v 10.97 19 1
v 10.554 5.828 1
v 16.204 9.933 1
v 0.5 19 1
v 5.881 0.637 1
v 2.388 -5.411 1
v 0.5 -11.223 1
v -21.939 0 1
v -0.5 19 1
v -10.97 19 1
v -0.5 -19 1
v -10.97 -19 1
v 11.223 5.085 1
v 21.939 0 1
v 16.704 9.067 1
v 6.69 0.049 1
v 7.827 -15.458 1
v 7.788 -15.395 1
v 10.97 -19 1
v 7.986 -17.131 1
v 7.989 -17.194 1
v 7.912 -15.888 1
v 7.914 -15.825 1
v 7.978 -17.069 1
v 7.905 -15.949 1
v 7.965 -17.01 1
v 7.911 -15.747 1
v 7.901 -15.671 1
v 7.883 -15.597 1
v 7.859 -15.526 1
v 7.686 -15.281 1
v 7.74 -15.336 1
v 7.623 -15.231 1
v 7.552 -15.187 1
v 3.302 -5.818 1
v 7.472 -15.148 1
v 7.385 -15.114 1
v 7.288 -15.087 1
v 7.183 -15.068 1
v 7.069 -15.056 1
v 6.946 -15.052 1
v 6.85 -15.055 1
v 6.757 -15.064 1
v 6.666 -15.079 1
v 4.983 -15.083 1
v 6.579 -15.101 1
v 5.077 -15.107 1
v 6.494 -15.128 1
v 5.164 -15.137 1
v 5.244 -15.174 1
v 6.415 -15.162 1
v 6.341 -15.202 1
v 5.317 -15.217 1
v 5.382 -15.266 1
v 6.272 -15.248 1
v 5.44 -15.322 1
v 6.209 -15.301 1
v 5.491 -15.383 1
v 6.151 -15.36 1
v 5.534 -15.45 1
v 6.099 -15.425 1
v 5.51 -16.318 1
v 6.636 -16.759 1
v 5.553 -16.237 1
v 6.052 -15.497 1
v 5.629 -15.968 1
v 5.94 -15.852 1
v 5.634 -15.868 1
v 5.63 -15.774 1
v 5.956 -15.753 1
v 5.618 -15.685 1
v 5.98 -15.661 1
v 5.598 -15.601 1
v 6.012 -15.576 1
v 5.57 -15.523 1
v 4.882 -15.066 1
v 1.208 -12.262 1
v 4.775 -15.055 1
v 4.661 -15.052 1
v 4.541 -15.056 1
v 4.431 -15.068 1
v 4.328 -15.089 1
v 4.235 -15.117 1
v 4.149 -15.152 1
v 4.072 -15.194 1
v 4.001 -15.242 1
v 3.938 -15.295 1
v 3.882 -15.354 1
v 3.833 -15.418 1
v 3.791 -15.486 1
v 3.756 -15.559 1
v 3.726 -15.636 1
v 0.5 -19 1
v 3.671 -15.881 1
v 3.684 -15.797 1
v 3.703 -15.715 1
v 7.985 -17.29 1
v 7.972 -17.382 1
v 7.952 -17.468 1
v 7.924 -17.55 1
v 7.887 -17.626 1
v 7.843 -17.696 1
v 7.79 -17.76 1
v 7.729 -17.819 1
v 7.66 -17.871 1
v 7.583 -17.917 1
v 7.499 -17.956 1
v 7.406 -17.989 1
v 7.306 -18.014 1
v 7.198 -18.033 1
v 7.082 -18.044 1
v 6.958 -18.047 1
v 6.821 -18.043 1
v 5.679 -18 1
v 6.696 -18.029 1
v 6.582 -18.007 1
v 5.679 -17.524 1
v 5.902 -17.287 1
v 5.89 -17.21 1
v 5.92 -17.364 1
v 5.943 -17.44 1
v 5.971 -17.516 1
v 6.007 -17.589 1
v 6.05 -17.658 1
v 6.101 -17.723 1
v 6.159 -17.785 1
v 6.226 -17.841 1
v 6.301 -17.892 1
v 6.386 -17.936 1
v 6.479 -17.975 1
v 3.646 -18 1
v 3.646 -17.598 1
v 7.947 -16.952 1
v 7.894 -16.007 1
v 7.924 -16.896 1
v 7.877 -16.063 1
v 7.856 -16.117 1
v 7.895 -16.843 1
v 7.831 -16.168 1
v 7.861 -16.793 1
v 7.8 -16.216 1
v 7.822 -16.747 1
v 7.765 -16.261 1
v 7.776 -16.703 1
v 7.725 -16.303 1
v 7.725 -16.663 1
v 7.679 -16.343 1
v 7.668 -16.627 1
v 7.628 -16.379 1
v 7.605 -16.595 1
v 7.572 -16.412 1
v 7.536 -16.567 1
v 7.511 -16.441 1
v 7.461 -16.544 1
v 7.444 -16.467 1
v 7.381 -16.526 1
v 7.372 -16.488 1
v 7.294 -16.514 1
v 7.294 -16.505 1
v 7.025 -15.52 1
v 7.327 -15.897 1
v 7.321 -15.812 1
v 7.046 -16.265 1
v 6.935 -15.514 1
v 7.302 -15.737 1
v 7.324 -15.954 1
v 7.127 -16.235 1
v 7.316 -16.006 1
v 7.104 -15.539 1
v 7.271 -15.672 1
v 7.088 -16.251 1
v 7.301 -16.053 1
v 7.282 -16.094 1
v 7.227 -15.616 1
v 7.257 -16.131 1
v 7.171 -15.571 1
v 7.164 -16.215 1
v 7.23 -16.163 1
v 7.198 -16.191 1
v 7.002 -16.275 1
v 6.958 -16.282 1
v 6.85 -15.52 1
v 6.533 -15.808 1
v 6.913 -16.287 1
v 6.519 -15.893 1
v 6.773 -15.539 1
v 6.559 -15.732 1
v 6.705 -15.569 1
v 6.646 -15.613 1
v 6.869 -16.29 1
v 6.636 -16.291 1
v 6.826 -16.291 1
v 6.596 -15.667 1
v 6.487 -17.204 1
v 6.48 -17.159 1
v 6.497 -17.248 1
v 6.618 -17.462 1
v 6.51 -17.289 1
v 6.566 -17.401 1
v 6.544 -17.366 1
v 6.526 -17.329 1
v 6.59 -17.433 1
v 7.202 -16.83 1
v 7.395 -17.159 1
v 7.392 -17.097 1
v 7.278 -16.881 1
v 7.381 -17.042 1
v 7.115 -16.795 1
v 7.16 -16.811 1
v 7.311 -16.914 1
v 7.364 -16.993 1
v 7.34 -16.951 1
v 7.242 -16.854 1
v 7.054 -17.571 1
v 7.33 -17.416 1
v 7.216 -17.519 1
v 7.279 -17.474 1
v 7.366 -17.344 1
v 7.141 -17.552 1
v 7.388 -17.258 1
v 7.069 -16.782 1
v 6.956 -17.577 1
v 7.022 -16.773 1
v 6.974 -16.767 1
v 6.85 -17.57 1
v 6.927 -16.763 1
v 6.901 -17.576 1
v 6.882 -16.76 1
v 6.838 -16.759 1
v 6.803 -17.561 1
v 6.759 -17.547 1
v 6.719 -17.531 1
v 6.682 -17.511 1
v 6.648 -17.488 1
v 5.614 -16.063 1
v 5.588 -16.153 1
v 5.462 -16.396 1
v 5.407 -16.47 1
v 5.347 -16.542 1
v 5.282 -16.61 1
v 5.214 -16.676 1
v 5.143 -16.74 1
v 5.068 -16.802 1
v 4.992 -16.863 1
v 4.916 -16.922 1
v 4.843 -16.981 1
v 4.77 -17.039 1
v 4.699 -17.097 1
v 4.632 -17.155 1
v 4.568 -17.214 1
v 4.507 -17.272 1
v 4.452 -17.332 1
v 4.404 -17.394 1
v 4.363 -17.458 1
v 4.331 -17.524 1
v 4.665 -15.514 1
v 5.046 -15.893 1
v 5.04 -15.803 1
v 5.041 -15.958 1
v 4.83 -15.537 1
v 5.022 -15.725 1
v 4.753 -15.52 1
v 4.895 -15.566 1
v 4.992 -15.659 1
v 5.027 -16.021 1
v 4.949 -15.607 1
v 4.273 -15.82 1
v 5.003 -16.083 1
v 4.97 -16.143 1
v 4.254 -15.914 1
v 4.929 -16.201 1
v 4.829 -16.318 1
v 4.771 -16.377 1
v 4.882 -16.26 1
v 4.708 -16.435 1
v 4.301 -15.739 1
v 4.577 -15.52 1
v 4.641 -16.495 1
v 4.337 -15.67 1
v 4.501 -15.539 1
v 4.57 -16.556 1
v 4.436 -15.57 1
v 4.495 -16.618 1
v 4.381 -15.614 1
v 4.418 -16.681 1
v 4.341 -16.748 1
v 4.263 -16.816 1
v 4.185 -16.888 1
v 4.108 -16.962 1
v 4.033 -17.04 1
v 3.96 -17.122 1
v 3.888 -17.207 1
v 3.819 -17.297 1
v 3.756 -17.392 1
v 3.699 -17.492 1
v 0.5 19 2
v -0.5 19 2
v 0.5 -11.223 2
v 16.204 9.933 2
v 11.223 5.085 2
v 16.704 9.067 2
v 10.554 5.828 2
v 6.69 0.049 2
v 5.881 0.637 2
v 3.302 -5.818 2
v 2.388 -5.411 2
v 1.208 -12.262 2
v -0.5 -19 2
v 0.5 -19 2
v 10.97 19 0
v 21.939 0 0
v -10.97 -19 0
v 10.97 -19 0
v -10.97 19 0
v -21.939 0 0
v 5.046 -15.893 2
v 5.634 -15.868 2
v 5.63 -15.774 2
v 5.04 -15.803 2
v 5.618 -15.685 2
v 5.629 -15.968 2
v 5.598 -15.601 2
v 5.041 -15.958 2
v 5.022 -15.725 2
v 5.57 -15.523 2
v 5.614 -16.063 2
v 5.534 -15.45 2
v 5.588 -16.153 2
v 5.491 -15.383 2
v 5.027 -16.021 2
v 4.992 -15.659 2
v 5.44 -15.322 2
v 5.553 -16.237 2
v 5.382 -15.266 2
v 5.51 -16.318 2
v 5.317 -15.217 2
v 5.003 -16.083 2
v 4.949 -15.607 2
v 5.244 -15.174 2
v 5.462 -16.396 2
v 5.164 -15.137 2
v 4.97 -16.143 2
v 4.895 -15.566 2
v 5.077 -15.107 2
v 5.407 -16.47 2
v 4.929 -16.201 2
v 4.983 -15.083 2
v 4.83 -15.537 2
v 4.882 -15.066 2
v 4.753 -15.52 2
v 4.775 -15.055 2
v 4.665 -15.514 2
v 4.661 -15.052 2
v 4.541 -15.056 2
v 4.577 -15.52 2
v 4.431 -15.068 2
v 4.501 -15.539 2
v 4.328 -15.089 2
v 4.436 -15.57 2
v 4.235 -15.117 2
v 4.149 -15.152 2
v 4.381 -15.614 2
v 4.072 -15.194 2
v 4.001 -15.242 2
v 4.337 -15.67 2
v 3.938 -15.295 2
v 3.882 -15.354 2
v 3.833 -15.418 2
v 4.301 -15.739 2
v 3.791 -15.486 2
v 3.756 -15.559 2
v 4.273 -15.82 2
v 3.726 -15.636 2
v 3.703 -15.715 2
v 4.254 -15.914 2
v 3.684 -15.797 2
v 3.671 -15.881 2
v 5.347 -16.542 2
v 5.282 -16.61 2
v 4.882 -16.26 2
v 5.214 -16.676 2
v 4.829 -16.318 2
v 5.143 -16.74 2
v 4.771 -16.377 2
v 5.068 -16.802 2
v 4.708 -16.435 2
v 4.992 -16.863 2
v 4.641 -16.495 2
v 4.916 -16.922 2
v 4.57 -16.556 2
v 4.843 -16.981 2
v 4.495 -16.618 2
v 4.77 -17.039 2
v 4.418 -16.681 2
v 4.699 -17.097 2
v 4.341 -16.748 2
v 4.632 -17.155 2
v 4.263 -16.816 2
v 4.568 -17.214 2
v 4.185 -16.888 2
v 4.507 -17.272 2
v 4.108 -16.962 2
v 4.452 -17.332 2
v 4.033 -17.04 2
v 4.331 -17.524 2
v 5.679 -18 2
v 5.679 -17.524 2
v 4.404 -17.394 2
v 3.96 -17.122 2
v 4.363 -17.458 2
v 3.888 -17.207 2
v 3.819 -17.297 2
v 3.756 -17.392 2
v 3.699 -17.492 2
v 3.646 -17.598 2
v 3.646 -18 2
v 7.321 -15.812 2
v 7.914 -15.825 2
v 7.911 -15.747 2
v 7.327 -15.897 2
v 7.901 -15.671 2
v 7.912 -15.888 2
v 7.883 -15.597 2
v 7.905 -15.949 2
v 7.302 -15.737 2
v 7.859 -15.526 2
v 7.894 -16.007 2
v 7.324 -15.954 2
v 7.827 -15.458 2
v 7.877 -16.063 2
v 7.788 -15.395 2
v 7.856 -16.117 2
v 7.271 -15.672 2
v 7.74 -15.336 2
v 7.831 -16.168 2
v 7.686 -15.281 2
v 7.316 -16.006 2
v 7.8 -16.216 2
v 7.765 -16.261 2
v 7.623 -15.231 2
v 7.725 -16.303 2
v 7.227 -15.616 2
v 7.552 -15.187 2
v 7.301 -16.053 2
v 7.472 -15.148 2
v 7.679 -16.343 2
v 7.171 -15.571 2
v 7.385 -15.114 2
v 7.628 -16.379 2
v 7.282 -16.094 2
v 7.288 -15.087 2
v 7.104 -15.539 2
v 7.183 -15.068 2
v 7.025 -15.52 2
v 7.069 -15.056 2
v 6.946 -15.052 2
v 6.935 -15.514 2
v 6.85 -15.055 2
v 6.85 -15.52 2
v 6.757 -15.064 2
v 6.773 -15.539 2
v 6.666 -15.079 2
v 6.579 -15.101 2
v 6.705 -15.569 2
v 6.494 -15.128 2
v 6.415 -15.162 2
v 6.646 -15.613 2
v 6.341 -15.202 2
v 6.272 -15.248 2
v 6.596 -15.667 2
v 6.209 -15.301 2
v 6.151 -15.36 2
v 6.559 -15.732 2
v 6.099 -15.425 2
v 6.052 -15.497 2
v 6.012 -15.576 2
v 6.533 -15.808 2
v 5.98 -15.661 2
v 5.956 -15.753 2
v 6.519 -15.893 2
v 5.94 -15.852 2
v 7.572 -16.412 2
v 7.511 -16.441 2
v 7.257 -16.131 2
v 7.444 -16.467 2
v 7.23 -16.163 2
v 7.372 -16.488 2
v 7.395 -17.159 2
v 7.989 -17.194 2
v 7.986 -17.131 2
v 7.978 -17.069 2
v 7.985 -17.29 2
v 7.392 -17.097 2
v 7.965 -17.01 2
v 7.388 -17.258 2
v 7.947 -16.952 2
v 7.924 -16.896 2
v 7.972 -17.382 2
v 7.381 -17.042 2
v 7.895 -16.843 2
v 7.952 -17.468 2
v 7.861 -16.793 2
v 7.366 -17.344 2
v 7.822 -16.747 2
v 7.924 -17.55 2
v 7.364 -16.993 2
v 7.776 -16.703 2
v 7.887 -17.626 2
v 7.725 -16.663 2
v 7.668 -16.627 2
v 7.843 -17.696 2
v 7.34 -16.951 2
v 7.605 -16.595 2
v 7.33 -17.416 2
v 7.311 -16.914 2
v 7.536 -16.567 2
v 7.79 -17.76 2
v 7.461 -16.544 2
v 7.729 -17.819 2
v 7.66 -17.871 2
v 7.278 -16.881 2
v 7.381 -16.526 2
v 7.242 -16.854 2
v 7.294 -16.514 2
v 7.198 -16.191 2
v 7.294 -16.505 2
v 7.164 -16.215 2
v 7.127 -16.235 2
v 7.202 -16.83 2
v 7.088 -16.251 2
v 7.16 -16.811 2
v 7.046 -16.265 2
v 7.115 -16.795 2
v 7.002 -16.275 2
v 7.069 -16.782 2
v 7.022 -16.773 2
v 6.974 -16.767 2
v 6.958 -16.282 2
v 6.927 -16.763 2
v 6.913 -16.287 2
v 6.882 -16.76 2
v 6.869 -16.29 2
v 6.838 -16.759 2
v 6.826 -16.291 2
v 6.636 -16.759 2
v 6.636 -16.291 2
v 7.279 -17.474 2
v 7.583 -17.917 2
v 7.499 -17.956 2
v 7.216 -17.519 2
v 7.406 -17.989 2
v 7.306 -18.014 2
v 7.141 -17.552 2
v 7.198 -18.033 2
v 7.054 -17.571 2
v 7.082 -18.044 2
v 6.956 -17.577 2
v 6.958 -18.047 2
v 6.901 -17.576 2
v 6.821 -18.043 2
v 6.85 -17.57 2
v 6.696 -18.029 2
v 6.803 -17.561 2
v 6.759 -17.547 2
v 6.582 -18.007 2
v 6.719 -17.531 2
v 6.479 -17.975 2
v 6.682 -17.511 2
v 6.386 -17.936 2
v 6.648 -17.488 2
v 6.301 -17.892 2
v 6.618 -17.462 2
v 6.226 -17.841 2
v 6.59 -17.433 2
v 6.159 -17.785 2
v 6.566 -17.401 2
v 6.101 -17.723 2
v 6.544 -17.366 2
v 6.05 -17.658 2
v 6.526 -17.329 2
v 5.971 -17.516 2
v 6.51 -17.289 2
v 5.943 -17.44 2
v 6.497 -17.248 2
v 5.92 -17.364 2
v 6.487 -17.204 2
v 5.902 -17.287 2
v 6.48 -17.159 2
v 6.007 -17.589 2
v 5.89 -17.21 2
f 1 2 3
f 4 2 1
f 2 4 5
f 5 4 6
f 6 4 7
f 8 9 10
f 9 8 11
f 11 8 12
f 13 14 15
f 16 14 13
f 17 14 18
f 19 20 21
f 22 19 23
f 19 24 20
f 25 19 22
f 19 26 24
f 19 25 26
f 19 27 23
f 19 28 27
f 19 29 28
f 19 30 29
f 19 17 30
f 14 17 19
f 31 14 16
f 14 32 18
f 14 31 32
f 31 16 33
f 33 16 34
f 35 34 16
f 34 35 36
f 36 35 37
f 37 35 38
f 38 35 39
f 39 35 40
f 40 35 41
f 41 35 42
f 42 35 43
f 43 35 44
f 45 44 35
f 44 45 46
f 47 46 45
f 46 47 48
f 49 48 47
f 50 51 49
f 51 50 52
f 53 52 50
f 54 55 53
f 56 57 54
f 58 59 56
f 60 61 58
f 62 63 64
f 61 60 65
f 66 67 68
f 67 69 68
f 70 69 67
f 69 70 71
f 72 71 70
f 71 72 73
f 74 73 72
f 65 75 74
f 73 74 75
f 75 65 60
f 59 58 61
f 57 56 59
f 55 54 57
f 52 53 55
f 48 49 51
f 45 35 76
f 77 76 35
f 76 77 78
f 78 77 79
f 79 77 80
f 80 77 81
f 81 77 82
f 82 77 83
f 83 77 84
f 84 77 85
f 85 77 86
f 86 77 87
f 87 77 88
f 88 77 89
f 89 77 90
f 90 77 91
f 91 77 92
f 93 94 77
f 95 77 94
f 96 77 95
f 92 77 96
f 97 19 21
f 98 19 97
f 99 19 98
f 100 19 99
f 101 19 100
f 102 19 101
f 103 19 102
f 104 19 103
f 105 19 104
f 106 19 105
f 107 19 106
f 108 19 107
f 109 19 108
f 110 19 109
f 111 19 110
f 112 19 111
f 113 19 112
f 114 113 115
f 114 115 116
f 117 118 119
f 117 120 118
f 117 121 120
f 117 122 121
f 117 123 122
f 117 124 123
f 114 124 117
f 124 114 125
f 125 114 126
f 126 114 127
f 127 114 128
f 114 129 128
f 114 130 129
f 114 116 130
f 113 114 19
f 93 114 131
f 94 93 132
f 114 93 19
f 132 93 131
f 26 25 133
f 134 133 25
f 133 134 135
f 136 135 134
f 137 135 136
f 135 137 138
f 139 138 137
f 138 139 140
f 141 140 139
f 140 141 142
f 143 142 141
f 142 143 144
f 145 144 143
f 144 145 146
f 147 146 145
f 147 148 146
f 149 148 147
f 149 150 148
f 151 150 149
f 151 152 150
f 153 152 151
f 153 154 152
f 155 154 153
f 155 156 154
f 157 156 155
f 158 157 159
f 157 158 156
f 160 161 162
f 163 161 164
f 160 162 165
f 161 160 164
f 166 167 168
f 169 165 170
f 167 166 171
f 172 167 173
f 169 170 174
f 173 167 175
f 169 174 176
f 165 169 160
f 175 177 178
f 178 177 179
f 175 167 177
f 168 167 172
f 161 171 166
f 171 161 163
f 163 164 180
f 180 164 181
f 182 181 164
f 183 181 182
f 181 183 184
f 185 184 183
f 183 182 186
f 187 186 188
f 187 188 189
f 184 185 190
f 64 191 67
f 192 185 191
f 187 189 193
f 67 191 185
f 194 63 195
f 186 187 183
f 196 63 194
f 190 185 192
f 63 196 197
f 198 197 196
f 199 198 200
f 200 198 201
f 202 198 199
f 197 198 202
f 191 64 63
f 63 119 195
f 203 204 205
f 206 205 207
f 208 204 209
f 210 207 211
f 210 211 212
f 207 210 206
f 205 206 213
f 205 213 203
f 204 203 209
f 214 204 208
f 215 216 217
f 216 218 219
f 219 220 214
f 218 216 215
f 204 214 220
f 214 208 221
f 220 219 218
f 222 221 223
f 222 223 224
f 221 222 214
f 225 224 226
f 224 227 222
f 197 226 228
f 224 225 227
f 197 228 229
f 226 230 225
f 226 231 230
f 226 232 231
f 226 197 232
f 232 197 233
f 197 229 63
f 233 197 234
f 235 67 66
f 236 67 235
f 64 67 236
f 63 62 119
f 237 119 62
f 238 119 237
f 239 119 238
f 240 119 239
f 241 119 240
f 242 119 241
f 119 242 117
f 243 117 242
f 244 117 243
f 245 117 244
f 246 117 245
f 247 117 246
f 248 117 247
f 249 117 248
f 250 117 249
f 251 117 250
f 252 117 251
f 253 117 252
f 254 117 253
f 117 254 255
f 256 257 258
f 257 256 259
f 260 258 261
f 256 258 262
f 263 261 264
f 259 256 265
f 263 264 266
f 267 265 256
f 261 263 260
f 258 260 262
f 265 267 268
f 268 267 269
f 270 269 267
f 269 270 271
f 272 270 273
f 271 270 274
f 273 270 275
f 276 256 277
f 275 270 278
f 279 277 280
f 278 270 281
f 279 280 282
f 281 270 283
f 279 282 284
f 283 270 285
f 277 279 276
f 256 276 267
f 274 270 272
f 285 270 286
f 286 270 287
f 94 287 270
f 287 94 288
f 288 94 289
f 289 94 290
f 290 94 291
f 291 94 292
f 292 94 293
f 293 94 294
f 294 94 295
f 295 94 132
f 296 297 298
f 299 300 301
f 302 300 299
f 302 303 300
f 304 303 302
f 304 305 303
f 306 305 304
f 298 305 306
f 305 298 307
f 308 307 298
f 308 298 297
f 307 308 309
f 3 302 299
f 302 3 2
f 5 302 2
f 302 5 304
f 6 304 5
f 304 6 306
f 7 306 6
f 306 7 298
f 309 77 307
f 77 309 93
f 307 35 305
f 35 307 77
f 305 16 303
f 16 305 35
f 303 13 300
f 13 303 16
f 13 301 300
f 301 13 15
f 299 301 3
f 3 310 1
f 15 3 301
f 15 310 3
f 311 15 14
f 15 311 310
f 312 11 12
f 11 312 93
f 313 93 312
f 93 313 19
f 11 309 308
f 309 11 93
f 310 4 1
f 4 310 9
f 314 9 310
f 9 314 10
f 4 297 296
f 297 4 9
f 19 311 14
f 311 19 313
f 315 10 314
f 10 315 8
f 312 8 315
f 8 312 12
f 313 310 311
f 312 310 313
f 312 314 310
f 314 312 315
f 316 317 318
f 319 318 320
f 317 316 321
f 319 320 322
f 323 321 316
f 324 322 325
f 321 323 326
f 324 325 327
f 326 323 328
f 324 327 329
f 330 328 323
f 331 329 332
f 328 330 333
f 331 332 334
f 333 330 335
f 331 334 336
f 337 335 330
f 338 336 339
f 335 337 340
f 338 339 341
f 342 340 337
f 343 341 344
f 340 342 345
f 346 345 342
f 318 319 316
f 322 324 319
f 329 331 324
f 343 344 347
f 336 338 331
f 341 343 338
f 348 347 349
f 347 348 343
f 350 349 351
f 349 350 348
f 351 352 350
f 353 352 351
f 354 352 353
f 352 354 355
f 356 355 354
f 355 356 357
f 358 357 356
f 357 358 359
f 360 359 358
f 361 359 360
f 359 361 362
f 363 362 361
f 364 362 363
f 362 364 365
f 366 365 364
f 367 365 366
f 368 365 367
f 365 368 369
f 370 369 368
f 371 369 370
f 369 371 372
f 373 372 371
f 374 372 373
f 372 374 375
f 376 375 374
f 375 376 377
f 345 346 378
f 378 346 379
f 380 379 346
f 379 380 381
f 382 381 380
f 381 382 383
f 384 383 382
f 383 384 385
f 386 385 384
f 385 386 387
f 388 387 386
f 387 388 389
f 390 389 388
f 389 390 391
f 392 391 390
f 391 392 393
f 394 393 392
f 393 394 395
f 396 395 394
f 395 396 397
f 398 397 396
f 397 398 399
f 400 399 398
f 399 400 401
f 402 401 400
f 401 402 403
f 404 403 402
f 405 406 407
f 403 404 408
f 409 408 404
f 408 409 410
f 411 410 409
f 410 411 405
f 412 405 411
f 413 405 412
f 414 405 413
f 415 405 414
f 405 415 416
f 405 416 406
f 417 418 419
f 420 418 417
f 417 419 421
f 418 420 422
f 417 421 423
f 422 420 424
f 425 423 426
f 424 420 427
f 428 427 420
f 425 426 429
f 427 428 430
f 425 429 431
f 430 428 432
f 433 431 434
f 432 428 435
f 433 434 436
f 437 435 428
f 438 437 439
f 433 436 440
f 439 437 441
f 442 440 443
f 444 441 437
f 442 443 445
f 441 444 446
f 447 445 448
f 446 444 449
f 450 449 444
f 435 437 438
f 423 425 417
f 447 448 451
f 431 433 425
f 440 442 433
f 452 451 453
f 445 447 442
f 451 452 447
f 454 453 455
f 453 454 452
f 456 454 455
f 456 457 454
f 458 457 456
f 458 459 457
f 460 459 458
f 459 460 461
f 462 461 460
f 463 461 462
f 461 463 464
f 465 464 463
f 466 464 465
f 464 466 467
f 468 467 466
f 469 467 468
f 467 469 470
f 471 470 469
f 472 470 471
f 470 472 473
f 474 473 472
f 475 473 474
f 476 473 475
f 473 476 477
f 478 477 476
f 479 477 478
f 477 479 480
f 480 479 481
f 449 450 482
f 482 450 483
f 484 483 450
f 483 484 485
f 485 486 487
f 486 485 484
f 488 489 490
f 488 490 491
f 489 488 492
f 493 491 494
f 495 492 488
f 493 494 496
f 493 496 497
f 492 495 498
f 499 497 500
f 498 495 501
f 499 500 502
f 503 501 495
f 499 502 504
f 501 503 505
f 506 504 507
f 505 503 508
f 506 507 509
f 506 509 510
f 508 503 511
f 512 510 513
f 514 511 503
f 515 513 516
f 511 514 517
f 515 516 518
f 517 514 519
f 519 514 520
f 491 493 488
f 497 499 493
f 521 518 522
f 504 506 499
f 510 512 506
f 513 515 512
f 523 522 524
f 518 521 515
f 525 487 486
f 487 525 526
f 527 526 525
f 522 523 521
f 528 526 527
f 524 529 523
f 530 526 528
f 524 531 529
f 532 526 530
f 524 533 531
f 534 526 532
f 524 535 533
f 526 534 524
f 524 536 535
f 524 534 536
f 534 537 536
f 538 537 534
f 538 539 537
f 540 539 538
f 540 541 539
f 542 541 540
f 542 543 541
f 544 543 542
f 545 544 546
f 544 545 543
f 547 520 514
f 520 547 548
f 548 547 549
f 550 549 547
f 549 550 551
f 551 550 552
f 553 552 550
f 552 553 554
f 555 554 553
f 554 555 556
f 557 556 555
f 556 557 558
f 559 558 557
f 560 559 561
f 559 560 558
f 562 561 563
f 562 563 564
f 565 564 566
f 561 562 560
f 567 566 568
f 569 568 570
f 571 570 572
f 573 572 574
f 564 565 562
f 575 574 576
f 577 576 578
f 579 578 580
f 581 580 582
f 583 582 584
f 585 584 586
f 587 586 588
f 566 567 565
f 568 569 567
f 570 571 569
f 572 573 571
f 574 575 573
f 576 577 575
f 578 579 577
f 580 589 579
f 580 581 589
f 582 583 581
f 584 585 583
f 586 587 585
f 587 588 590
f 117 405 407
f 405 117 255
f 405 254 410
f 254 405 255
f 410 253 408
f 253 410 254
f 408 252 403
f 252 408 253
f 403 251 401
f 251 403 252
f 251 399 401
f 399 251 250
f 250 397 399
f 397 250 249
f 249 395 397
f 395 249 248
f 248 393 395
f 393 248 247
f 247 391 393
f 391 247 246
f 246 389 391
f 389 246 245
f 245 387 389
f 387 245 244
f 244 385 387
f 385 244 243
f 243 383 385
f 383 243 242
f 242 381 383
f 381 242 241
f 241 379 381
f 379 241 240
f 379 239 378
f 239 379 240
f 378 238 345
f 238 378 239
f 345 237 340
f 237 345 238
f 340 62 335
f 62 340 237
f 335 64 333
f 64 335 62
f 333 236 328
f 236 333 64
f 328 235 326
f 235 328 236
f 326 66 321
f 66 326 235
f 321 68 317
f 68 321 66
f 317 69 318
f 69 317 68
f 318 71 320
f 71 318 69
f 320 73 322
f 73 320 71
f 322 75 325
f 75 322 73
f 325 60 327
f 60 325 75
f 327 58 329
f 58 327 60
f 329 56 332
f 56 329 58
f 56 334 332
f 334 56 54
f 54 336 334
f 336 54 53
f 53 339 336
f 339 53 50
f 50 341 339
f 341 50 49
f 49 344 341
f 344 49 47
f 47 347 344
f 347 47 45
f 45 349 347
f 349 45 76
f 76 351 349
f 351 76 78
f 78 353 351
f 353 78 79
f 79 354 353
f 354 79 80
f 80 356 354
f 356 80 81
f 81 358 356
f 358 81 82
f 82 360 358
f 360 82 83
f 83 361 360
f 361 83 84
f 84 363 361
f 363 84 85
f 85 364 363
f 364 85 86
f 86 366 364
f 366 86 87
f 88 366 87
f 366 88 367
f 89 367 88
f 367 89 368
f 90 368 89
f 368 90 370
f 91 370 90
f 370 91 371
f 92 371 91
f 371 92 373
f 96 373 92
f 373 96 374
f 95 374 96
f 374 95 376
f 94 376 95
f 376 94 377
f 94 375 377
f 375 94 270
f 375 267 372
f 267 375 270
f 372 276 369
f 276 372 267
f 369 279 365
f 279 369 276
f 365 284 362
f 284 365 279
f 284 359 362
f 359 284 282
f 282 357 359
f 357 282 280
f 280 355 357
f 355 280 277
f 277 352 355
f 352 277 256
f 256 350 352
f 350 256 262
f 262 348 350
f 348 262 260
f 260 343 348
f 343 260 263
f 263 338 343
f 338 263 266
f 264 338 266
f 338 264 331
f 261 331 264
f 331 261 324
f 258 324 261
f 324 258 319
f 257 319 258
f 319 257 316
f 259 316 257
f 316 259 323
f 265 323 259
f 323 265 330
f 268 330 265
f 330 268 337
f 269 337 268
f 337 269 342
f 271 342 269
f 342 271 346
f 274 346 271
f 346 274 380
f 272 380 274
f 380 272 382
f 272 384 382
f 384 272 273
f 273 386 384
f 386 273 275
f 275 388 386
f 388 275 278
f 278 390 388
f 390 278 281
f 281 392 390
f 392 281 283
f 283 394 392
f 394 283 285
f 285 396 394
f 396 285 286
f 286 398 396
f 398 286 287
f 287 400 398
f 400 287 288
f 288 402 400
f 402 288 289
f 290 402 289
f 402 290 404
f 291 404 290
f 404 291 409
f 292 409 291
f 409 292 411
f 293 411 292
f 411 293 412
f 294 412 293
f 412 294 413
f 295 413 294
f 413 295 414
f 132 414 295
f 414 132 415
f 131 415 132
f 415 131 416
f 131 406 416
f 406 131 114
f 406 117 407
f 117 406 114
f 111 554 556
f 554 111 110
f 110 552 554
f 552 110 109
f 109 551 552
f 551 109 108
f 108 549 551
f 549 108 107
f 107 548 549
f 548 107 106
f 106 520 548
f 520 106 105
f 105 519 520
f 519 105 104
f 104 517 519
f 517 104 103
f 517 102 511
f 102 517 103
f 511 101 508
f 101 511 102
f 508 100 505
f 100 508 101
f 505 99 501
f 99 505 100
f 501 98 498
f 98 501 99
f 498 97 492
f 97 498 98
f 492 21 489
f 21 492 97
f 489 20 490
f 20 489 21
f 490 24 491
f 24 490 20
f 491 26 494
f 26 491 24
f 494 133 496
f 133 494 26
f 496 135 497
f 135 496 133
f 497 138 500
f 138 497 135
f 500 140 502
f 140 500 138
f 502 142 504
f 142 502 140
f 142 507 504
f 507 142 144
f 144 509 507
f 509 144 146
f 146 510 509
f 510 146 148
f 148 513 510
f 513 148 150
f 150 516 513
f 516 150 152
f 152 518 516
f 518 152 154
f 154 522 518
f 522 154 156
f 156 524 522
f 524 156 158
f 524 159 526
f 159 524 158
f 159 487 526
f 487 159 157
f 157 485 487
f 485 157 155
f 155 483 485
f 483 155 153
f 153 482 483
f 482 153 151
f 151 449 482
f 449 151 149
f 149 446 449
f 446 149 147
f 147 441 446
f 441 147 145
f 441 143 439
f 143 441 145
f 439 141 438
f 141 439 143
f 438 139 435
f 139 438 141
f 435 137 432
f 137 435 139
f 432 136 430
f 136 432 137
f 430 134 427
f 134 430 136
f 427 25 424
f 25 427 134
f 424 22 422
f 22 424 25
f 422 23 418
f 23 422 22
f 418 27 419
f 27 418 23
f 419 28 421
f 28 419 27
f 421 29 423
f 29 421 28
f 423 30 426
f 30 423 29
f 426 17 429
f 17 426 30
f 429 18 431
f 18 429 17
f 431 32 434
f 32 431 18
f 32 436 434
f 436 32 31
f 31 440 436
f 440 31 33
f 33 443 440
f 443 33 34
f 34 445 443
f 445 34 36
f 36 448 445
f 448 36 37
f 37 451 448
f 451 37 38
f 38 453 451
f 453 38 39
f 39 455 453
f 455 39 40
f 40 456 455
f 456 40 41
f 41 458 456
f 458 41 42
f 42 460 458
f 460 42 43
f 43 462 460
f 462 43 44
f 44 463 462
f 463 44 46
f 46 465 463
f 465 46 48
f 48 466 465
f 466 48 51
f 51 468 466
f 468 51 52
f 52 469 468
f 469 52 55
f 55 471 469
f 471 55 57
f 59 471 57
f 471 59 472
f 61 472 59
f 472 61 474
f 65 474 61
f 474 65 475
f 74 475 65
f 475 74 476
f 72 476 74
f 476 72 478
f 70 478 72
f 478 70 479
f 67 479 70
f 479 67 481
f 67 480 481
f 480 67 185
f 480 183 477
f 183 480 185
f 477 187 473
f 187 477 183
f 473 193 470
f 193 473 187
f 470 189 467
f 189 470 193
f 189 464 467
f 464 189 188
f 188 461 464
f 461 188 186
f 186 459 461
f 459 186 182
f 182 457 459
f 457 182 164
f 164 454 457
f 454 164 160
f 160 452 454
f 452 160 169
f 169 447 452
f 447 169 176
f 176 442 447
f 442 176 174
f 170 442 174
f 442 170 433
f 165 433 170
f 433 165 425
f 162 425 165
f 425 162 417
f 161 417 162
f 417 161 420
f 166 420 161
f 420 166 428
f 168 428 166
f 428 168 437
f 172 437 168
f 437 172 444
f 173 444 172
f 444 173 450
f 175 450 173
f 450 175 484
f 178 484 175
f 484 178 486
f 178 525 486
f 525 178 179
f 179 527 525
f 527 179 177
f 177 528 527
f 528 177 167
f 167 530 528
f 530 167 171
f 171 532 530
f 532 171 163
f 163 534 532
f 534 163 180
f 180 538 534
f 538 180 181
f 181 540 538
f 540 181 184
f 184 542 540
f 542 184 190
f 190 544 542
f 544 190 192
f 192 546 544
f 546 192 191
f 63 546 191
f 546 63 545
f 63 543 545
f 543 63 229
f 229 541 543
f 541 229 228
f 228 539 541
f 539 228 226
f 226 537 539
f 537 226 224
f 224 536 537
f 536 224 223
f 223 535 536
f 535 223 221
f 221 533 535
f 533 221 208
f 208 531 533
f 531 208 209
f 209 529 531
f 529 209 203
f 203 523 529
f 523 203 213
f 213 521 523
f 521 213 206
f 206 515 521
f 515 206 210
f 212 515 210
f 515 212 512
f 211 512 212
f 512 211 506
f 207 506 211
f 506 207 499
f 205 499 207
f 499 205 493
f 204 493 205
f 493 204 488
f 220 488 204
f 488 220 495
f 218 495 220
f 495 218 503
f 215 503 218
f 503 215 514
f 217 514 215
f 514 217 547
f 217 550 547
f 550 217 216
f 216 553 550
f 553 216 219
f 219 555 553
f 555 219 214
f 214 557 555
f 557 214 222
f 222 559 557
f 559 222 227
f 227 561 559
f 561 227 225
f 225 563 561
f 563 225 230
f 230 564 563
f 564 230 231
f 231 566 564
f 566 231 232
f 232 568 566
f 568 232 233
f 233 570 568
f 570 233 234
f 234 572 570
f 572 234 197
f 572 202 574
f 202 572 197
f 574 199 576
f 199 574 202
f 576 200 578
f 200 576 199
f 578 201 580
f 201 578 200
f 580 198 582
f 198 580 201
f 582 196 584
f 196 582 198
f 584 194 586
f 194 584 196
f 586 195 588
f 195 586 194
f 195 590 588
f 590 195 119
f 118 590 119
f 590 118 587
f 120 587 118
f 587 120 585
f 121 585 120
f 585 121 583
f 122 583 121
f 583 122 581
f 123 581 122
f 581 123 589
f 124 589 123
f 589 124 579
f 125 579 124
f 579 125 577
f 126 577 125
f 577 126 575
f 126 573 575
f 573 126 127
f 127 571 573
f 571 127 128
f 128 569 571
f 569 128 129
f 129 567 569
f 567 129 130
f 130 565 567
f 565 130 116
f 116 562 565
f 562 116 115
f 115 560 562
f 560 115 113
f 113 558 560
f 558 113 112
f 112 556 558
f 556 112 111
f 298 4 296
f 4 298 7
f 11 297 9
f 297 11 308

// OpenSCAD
include <../Scripts/18xx tiles basic functions.scad>
hex("Green");
put_tilenr("23");
light_curve();
straight_line();
